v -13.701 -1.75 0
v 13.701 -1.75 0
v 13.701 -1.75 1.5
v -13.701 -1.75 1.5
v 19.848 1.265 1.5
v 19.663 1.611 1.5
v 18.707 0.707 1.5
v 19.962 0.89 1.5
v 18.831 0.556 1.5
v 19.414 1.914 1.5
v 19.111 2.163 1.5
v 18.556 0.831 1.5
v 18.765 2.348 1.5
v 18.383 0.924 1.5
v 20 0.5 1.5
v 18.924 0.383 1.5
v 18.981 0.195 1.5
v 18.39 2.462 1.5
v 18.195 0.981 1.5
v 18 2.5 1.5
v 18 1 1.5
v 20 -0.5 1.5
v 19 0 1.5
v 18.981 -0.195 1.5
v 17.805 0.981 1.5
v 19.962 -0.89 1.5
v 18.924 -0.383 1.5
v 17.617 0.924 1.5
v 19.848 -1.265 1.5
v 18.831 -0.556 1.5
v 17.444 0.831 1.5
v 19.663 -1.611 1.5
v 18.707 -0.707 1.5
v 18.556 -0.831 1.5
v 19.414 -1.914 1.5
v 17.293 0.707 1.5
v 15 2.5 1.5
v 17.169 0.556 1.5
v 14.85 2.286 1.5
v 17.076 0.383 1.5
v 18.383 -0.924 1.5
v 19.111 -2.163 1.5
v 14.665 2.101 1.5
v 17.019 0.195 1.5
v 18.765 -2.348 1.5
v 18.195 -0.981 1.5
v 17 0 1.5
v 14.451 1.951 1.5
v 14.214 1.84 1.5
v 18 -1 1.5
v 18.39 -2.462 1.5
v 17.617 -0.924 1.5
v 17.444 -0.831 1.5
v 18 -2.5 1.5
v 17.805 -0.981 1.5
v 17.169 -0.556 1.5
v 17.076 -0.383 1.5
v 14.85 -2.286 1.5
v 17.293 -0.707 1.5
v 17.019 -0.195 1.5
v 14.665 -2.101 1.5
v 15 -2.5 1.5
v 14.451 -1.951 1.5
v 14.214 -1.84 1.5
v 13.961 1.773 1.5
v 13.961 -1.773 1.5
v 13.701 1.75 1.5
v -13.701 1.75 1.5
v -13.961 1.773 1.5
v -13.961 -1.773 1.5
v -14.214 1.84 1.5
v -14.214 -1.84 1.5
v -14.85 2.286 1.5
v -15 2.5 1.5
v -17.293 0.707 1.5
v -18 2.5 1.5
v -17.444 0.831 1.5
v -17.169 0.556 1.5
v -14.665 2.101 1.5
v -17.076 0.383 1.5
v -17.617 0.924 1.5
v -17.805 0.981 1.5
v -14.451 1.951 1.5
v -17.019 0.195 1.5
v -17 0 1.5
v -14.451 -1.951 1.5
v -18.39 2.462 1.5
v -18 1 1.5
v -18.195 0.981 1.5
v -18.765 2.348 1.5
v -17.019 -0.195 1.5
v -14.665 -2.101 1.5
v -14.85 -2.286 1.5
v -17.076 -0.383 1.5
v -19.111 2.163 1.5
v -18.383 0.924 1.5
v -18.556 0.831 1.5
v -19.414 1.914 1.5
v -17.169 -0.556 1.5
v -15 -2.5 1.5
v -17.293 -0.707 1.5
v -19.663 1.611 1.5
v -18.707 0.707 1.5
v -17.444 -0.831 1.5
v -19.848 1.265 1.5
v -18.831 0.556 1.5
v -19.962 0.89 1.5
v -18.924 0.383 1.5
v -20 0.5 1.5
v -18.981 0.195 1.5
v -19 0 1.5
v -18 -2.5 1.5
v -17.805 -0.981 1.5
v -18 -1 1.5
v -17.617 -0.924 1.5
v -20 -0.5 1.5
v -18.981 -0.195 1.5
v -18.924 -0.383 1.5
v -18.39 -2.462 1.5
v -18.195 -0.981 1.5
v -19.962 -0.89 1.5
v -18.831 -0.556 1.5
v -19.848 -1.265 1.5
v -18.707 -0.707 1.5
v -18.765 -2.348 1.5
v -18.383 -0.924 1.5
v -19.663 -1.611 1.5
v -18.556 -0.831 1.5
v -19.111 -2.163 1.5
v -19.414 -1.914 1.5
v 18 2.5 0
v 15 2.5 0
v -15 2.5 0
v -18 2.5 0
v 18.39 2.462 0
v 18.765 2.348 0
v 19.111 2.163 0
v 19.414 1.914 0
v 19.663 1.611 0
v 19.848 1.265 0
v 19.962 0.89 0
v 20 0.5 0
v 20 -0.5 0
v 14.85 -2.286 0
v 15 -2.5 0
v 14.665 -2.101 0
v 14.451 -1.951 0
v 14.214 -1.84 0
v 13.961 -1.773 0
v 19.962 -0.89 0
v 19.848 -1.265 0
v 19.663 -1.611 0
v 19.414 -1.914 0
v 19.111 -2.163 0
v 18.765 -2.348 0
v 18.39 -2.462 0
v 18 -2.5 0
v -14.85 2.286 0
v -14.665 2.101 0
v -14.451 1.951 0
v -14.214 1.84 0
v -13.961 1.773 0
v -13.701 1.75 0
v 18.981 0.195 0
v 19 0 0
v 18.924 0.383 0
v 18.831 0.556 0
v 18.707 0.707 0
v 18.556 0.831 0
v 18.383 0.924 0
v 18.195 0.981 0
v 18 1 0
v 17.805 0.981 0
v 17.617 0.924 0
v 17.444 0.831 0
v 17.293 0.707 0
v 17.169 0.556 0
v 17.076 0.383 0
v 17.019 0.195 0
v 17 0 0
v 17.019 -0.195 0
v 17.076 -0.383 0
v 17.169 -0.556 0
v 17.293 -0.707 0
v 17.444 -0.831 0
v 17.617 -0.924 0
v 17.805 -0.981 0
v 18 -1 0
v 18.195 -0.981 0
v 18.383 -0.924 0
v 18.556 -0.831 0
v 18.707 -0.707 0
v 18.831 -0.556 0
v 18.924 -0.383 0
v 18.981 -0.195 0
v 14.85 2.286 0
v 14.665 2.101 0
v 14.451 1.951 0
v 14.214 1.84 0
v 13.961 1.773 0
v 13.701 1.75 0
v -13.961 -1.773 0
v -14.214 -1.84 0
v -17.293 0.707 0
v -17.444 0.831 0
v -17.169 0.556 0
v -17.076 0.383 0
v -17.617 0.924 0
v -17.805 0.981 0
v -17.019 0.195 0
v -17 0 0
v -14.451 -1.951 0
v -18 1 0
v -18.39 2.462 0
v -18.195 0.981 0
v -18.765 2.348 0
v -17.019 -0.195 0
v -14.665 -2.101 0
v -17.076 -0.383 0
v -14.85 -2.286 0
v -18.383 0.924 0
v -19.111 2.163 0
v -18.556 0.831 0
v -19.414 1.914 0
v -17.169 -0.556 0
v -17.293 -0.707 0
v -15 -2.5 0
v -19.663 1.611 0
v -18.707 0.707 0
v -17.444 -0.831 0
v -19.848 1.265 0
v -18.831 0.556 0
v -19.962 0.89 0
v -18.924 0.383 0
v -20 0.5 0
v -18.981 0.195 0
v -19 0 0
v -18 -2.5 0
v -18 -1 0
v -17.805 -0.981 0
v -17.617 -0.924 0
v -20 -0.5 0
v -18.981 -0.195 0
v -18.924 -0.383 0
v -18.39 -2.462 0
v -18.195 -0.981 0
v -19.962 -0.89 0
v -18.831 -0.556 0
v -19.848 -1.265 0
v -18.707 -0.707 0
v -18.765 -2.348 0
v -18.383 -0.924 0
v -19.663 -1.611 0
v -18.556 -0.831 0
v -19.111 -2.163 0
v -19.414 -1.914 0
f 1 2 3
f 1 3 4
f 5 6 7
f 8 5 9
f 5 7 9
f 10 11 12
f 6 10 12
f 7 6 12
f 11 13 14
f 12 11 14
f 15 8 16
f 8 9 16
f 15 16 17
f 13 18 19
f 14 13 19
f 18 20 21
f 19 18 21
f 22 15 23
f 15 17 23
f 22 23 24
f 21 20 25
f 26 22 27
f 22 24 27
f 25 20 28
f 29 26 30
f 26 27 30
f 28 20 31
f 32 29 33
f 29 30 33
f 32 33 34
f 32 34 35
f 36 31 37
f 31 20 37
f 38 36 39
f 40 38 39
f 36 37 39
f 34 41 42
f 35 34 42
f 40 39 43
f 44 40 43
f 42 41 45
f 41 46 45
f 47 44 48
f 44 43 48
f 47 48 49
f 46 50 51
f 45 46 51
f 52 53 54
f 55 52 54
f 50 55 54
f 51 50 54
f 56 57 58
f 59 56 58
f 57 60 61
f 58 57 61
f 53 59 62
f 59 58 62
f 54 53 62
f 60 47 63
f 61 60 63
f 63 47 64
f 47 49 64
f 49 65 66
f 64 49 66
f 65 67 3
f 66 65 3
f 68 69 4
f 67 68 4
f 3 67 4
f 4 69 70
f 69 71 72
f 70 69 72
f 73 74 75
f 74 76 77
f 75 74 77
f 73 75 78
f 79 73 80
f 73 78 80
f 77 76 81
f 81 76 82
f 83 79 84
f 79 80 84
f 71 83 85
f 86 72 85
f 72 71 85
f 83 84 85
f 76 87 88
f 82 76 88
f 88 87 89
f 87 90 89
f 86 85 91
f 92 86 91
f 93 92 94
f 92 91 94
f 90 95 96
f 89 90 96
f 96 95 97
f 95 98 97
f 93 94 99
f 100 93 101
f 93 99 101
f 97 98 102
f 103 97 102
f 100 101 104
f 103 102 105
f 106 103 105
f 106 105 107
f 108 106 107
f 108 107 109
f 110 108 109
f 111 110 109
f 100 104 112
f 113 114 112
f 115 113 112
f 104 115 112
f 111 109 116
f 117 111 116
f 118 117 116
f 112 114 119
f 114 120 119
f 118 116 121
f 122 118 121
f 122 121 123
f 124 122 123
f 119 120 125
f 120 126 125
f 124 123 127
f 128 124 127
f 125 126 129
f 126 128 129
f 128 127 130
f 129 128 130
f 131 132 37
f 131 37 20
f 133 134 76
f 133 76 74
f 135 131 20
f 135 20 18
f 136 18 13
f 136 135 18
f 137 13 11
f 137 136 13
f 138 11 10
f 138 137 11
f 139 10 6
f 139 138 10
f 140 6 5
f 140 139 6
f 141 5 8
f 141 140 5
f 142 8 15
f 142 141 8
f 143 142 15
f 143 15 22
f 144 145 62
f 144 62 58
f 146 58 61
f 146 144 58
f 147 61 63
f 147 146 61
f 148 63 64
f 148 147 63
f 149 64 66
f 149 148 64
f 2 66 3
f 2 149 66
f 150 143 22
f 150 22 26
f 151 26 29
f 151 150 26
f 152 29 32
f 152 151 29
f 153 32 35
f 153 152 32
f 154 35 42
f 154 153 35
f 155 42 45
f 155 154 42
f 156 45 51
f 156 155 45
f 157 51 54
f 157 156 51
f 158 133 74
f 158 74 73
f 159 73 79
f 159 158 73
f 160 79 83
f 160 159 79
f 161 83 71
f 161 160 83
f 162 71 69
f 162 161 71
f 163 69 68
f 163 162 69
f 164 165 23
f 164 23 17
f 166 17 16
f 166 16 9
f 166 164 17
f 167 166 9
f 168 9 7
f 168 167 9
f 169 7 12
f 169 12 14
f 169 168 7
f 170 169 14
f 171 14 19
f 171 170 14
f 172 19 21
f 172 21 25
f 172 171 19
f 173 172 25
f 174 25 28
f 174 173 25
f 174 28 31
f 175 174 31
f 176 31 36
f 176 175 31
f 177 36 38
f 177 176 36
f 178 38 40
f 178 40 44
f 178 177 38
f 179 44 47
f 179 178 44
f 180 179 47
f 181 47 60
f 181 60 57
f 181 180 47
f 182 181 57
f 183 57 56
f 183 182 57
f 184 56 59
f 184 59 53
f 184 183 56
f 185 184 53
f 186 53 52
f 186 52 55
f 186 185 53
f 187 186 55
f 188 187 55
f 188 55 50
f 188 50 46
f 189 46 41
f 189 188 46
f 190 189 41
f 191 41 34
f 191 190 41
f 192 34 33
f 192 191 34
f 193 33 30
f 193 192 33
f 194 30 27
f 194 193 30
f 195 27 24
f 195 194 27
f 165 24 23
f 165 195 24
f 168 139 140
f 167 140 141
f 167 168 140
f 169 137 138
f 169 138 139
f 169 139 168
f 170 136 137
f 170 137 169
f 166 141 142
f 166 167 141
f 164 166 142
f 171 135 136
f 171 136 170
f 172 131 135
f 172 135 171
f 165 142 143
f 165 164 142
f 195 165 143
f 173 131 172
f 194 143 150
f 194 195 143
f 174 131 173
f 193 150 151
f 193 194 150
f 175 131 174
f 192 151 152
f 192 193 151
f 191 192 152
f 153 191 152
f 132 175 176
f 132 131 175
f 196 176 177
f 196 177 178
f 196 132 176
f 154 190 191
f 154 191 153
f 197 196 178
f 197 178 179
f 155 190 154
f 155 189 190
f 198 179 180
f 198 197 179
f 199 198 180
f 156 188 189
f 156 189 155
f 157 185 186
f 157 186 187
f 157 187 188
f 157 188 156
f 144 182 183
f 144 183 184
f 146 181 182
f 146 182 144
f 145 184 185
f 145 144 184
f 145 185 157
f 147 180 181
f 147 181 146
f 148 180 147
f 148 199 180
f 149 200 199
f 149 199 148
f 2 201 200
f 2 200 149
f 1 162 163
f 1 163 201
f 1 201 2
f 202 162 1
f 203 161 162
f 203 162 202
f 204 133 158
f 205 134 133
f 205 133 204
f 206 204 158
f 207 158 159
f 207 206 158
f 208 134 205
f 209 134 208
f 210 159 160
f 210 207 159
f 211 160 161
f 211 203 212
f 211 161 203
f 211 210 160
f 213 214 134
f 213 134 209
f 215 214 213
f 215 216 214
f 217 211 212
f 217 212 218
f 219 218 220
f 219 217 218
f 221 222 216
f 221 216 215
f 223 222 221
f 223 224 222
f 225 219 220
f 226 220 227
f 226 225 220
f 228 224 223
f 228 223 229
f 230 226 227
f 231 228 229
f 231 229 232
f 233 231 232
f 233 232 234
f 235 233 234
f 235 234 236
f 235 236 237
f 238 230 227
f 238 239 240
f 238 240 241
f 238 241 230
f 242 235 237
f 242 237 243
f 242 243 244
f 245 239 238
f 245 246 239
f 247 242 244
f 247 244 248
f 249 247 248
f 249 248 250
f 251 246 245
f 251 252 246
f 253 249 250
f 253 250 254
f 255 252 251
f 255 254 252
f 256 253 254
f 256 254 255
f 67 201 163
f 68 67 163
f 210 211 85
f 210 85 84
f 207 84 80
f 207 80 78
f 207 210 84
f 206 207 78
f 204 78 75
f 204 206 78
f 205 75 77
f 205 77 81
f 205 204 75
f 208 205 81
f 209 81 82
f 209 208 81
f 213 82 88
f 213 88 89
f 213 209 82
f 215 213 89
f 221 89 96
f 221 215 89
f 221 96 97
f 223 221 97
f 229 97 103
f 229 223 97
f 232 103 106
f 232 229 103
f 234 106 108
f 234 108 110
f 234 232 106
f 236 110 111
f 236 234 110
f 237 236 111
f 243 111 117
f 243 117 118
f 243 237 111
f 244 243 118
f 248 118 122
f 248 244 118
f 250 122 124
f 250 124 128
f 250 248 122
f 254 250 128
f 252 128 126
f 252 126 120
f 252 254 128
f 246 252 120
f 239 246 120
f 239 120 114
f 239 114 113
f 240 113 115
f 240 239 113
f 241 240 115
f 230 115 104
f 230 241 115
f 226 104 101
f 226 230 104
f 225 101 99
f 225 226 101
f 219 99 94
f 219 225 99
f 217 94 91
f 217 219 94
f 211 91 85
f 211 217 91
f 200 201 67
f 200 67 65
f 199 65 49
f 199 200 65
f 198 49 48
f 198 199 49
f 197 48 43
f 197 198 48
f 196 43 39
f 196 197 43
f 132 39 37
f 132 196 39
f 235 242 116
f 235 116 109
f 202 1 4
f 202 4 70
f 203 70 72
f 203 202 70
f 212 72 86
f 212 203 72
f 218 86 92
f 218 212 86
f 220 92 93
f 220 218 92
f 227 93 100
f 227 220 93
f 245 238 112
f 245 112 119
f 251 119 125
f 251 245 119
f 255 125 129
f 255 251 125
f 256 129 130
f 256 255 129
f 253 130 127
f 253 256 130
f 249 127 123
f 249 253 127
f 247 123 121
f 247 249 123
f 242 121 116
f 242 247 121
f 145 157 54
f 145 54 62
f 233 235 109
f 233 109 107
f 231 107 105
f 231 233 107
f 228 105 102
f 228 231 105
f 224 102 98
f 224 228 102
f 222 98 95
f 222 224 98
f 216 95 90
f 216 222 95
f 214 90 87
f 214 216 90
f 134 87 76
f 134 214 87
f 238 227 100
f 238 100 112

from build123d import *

# Parameters (mm, degrees)
SKETCH1_R           = 1
BOSS_EXTRUDE1_DEPTH = 1.5
SKETCH2_W           = 30
SKETCH2_H           = 1.5
CUT_EXTRUDE1_DEPTH  = 21.211382931
FILLET1_R           = 1.5


with BuildPart() as part:
    # Sketch1 → Boss-Extrude1 (new body)
    with BuildSketch(Plane.XY):
        with BuildLine():
            Line((-18, 2.5), (18, 2.5))
            ThreePointArc((18, 2.5), (19.414213562, 1.914213562), (20, 0.5))
            Line((20, 0.5), (20, -0.5))
            ThreePointArc((20, -0.5), (19.414213562, -1.914213562), (18, -2.5))
            Line((18, -2.5), (-18, -2.5))
            ThreePointArc((-18, -2.5), (-19.414213562, -1.914213562), (-20, -0.5))
            Line((-20, -0.5), (-20, 0.5))
            ThreePointArc((-20, 0.5), (-19.414213562, 1.914213562), (-18, 2.5))
        make_face()
        with Locations((18, 0)):
            Circle(SKETCH1_R, mode=Mode.SUBTRACT)
        with Locations((-18, 0)):
            Circle(SKETCH1_R, mode=Mode.SUBTRACT)
    extrude(amount=BOSS_EXTRUDE1_DEPTH)

    # Sketch2 → Cut-Extrude1 (cut, through all)
    with BuildSketch(Plane(origin=(0, 0, 0), x_dir=(-1, 0, 0), z_dir=(0, 0, -1))):
        with Locations((0, 2.5)):
            Rectangle(SKETCH2_W, SKETCH2_H)
        with Locations((0, -2.5)):
            Rectangle(SKETCH2_W, SKETCH2_H)
    extrude(amount=-CUT_EXTRUDE1_DEPTH, mode=Mode.SUBTRACT)

    # Fillet1
    # the kernel refuses this fillet: 1.5 mm, written as the material it adds along each edge
    with BuildSketch(Plane(origin=(15, 1.75, 0), x_dir=(0, 1, 0), z_dir=(0, 0, 1)), Plane(origin=(-15, -1.75, 0), x_dir=(0, -1, 0), z_dir=(0, 0, 1))) as fillet1_piece_1:
        with BuildLine():
            CenterArc((1.5, 1.299038106), FILLET1_R, 180, 60)
            Line((0, 1.299038106), (-0.03, 1.299038106))
            Line((-0.03, 1.299038106), (-0.03, 0))
            Line((-0.03, 0), (0, -0.03))
            ThreePointArc((0, -0.03), (0.375, -0.03), (0.735, -0.025980762))
            Line((0.735, -0.025980762), (0.75, 0))
        make_face()
    extrude(amount=1.5)
    with BuildSketch(Plane(origin=(15, -1.75, 0), x_dir=(-1, 0, 0), z_dir=(0, 0, 1))) as fillet1_piece_2:
        with BuildLine():
            CenterArc((1.299038106, 1.5), FILLET1_R, 210, 60)
            Line((0, 0.75), (-0.025980762, 0.735))
            ThreePointArc((-0.025980762, 0.735), (-0.03, 0.375), (-0.03, 0))
            Line((-0.03, 0), (0, -0.03))
            Line((0, -0.03), (1.299038106, -0.03))
            Line((1.299038106, -0.03), (1.299038106, 0))
        make_face()
    extrude(amount=1.5)
    with BuildSketch(Plane(origin=(-15, 1.75, 0), x_dir=(0, 1, 0), z_dir=(0, 0, 1))) as fillet1_piece_3:
        with BuildLine():
            CenterArc((1.5, -1.299038106), FILLET1_R, 120, 60)
            Line((0, -1.299038106), (-0.03, -1.299038106))
            Line((-0.03, -1.299038106), (-0.03, 0))
            Line((-0.03, 0), (0, 0.03))
            ThreePointArc((0, 0.03), (0.375, 0.03), (0.735, 0.025980762))
            Line((0.735, 0.025980762), (0.75, 0))
        make_face()
    extrude(amount=1.5)


solid = part.part
